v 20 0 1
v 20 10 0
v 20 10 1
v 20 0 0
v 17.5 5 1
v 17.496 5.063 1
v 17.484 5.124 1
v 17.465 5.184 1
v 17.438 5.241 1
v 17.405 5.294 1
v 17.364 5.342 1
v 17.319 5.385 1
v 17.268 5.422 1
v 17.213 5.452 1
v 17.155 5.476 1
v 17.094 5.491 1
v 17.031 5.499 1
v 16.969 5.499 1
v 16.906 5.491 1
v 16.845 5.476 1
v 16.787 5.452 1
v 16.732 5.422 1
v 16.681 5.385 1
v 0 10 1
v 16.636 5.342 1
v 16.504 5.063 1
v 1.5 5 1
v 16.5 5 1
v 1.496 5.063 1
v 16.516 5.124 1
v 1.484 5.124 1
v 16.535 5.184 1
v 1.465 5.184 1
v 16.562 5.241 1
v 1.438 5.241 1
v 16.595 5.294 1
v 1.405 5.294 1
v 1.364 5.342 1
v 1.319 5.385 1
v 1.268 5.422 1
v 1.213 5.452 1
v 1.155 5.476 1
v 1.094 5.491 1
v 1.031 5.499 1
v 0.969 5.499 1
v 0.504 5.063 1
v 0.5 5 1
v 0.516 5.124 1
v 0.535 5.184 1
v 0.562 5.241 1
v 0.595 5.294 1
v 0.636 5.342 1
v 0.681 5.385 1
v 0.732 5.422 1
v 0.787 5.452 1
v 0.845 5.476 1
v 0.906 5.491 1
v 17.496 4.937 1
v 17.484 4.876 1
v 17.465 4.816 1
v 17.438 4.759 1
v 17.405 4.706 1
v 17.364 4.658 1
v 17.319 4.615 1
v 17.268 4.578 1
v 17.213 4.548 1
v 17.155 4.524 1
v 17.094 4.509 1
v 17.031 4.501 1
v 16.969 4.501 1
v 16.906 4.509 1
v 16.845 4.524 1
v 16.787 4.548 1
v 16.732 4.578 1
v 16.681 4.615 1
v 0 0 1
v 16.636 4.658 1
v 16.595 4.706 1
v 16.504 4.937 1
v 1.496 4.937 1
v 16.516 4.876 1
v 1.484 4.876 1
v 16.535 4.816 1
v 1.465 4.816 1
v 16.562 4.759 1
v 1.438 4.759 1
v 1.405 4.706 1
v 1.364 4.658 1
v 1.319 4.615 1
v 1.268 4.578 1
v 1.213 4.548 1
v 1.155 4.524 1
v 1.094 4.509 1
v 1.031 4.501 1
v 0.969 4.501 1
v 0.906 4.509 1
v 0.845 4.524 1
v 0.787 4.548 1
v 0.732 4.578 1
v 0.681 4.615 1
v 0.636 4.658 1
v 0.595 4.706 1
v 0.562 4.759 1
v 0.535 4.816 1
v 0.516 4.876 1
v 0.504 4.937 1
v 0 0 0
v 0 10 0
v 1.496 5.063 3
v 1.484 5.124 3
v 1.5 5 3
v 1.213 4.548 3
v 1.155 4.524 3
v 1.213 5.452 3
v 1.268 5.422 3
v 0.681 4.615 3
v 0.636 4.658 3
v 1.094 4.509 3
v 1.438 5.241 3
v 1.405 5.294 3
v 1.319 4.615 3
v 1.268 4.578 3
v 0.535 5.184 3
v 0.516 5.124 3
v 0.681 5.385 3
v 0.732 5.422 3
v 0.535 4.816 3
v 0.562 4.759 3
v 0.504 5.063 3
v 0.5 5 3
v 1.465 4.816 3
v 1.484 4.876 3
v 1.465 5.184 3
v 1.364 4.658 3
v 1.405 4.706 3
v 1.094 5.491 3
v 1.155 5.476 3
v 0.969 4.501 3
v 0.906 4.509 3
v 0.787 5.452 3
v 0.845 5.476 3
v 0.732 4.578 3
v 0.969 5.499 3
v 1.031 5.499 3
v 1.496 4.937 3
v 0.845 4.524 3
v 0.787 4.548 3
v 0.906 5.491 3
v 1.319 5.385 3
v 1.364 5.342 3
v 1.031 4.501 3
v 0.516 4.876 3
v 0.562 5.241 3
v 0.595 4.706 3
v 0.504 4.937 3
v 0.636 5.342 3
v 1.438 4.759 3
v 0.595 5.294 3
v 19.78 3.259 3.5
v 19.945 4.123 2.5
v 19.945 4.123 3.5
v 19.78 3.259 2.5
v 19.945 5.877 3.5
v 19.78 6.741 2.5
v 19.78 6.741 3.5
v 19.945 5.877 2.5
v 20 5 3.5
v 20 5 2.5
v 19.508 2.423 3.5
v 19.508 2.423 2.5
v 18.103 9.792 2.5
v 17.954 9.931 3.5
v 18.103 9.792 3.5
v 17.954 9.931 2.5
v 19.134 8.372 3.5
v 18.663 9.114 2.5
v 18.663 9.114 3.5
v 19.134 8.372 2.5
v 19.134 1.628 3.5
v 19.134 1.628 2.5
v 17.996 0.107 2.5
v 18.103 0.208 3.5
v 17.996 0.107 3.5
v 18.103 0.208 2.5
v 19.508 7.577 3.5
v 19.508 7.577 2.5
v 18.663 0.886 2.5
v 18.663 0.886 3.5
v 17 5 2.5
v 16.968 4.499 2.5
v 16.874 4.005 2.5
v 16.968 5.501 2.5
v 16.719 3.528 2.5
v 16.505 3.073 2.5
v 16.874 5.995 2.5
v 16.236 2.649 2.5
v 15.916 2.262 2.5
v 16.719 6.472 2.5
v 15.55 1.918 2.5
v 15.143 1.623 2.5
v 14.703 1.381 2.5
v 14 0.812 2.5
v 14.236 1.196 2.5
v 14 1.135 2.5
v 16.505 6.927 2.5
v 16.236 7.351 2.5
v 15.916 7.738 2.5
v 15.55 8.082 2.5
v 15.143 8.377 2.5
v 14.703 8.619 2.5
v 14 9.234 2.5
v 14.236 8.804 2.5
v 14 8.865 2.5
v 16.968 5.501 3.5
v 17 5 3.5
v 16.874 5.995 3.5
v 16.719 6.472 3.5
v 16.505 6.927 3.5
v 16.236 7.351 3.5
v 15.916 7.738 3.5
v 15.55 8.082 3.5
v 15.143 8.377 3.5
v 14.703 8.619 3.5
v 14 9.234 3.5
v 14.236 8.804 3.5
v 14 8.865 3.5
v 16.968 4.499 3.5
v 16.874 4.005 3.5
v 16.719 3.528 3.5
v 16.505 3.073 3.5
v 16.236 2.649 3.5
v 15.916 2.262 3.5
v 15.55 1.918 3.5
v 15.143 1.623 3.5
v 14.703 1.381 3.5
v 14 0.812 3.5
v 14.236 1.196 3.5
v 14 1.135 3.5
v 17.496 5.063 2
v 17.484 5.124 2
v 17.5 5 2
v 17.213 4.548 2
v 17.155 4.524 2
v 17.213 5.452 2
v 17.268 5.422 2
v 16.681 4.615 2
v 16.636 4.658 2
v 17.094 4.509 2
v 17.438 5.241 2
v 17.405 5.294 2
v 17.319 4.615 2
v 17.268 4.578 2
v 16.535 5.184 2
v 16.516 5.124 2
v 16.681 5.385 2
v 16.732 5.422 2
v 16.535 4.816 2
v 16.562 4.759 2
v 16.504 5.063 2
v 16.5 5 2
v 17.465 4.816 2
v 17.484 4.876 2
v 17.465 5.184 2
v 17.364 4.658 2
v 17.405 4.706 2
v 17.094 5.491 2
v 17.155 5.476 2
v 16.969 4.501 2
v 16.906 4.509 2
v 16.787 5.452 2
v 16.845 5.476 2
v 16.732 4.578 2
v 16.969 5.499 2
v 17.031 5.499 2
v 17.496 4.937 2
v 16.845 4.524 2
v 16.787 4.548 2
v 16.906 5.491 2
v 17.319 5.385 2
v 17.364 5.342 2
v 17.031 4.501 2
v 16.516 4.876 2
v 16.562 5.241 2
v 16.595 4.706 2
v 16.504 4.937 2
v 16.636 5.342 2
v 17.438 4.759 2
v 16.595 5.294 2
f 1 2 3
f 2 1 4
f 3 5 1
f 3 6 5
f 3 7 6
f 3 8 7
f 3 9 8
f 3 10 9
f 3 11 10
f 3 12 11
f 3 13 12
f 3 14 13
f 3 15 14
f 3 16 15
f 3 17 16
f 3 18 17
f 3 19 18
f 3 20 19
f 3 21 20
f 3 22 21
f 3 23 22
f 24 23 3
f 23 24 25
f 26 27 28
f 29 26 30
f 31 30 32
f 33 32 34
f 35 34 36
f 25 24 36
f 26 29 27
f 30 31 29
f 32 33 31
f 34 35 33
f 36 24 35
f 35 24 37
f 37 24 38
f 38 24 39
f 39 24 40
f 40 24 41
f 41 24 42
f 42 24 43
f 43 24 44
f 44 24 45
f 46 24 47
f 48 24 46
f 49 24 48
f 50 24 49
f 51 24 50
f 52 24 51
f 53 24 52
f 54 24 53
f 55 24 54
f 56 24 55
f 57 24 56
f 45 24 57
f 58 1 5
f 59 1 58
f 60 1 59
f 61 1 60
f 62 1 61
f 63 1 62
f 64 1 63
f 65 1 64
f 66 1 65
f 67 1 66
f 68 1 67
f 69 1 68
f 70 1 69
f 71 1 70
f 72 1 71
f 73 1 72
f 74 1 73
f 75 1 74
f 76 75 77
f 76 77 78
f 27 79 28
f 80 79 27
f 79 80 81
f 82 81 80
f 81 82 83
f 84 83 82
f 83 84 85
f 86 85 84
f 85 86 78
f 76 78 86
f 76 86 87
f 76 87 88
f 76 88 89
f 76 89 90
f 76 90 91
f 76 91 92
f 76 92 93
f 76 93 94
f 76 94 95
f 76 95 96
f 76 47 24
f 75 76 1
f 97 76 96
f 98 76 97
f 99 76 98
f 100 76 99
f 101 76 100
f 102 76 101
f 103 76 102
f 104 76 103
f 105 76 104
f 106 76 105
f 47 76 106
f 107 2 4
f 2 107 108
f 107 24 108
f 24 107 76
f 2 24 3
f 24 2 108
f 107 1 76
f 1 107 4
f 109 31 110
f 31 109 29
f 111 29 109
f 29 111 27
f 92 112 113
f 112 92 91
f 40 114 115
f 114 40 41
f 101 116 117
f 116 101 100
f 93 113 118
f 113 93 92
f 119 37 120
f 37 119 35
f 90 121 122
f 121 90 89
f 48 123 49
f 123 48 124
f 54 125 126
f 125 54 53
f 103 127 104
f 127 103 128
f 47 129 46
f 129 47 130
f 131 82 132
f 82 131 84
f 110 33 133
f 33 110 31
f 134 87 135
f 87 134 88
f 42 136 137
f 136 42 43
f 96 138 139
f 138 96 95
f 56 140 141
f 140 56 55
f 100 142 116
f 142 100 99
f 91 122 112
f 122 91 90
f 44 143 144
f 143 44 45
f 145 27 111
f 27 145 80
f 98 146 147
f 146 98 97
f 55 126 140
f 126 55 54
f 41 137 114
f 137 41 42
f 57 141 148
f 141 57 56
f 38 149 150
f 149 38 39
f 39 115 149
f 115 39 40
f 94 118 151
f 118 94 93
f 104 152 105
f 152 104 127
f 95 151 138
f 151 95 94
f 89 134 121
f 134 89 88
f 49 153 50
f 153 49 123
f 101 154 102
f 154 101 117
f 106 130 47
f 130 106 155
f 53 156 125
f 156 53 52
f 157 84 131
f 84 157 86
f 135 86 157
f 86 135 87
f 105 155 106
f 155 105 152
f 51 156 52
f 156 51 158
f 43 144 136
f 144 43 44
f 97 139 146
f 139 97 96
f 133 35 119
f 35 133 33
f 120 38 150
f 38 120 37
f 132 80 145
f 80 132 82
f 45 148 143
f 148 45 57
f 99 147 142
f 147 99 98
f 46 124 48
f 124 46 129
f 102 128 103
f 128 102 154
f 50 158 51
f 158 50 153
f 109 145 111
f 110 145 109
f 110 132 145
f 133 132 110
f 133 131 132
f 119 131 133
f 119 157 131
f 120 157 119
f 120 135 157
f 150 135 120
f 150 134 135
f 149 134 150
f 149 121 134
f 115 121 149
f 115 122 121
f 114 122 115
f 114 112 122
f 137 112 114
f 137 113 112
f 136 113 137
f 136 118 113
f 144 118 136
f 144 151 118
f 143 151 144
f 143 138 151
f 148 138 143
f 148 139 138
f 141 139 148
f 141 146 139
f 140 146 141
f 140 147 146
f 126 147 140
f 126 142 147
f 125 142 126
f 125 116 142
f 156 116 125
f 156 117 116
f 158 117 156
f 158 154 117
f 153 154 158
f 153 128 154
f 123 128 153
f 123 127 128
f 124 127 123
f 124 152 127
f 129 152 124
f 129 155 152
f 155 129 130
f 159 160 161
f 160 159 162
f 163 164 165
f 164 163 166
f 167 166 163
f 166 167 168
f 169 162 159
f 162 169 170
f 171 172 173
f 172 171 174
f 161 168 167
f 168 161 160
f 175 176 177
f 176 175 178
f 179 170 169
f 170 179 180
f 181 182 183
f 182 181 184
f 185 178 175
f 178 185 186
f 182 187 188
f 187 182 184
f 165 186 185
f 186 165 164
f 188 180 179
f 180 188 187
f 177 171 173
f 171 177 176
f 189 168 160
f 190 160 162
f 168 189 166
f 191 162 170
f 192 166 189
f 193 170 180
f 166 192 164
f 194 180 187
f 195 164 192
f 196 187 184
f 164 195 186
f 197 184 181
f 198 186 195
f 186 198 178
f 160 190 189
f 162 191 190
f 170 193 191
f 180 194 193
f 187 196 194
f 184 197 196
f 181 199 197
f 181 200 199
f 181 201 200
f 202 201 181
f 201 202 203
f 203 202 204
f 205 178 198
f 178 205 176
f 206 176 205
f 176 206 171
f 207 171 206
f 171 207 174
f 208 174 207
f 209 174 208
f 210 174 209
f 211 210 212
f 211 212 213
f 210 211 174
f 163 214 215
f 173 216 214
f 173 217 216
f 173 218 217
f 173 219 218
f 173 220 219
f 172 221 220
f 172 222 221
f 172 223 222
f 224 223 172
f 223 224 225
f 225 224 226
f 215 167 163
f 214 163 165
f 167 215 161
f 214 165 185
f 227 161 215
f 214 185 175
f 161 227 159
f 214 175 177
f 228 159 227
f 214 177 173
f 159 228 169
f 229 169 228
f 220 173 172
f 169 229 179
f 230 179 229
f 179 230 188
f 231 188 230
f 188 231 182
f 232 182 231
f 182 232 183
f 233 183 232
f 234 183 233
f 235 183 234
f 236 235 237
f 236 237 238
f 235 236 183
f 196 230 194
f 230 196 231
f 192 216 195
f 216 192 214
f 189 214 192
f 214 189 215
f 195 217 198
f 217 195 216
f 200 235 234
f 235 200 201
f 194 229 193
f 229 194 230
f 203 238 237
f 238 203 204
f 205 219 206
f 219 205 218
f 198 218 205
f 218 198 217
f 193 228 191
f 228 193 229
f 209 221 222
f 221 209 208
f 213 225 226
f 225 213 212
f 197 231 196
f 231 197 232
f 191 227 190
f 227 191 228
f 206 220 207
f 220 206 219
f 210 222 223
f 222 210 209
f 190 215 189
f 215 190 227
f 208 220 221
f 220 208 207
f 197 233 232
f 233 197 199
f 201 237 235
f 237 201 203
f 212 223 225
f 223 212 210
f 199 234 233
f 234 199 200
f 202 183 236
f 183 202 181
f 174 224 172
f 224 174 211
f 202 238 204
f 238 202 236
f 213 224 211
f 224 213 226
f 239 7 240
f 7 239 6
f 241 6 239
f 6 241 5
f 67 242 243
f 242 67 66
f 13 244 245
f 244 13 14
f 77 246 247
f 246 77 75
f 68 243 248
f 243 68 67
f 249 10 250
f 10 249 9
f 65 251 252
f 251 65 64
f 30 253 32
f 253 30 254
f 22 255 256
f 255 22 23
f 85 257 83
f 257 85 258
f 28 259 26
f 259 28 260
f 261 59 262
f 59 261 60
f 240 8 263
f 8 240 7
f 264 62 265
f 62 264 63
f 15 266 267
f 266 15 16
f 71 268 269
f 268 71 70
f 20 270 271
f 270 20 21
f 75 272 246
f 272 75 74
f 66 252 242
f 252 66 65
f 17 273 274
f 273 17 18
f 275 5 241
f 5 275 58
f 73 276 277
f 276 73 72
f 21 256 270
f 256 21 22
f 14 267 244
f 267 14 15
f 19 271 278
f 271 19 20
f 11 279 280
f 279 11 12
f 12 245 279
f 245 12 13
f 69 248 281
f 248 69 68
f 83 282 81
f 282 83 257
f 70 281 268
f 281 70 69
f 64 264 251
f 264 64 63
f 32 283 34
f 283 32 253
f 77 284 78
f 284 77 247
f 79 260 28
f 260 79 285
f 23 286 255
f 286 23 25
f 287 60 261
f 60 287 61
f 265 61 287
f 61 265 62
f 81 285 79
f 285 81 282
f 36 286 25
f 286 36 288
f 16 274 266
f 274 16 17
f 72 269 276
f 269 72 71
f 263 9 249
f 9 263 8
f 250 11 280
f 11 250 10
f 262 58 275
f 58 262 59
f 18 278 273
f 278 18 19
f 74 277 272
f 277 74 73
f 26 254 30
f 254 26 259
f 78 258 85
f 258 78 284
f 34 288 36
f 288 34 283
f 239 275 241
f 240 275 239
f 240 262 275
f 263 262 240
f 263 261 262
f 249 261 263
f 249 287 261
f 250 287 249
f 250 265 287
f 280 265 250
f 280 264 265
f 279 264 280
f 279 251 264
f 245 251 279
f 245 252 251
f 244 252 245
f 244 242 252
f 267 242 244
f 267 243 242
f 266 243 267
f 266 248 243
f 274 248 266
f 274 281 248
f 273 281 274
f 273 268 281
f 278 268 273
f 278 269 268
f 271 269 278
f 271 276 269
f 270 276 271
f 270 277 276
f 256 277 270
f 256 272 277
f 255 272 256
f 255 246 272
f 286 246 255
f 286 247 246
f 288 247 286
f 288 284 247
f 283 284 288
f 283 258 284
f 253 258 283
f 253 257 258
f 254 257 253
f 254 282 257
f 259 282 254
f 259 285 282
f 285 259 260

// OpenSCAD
// file: sway.scad
module base()
{
	cube([20, 10, 1]);
	translate([1,5,1])
		cylinder(r=0.5, h=2, $fn=50);
}

module sway(){
	difference(){
		cylinder(r=1, h=1, $fn=50);
		cylinder(r=0.7, h=2, $fn=50);
	}
	translate([0.7, -0.5, 0])
		cube([15,1,1]);

	translate([15,-2.5,0])
		cube([3,5,1]);
}

base();
translate([1,5,1.5])
	rotate([0,0,50]) //can adjust
	%sway();
// main file
use <sway.scad>;
difference(){
	base();
	for()
	rotate([0,0,50])
		cylinder(r=0.5, h=1, $fn=50);
}
translate([1,5,1.5])
	//rotate([0,0,50]) //can adjust
	%sway();

translate([17,5,1])
	cylinder(r=0.5, h=1, $fn=50);

module outbox(){
	translate([-6,-6,-1])
	rotate([0,0,-10])
		cube([15,3,3]);

	translate([-6,3,-1])
	rotate([0,0,10])
		cube([15,3,3]);
	
	translate([-8,-7,-1])
		cube([9,16,3]);
}

module seat(){
	difference(){
		difference(){
			cylinder(r=7, h=1, $fn=50);
			translate([0,0,-1])
				cylinder(r=4, h=3, $fn=50);
		}
	outbox();
	}
}

translate([13, 5, 2.5])
seat();
